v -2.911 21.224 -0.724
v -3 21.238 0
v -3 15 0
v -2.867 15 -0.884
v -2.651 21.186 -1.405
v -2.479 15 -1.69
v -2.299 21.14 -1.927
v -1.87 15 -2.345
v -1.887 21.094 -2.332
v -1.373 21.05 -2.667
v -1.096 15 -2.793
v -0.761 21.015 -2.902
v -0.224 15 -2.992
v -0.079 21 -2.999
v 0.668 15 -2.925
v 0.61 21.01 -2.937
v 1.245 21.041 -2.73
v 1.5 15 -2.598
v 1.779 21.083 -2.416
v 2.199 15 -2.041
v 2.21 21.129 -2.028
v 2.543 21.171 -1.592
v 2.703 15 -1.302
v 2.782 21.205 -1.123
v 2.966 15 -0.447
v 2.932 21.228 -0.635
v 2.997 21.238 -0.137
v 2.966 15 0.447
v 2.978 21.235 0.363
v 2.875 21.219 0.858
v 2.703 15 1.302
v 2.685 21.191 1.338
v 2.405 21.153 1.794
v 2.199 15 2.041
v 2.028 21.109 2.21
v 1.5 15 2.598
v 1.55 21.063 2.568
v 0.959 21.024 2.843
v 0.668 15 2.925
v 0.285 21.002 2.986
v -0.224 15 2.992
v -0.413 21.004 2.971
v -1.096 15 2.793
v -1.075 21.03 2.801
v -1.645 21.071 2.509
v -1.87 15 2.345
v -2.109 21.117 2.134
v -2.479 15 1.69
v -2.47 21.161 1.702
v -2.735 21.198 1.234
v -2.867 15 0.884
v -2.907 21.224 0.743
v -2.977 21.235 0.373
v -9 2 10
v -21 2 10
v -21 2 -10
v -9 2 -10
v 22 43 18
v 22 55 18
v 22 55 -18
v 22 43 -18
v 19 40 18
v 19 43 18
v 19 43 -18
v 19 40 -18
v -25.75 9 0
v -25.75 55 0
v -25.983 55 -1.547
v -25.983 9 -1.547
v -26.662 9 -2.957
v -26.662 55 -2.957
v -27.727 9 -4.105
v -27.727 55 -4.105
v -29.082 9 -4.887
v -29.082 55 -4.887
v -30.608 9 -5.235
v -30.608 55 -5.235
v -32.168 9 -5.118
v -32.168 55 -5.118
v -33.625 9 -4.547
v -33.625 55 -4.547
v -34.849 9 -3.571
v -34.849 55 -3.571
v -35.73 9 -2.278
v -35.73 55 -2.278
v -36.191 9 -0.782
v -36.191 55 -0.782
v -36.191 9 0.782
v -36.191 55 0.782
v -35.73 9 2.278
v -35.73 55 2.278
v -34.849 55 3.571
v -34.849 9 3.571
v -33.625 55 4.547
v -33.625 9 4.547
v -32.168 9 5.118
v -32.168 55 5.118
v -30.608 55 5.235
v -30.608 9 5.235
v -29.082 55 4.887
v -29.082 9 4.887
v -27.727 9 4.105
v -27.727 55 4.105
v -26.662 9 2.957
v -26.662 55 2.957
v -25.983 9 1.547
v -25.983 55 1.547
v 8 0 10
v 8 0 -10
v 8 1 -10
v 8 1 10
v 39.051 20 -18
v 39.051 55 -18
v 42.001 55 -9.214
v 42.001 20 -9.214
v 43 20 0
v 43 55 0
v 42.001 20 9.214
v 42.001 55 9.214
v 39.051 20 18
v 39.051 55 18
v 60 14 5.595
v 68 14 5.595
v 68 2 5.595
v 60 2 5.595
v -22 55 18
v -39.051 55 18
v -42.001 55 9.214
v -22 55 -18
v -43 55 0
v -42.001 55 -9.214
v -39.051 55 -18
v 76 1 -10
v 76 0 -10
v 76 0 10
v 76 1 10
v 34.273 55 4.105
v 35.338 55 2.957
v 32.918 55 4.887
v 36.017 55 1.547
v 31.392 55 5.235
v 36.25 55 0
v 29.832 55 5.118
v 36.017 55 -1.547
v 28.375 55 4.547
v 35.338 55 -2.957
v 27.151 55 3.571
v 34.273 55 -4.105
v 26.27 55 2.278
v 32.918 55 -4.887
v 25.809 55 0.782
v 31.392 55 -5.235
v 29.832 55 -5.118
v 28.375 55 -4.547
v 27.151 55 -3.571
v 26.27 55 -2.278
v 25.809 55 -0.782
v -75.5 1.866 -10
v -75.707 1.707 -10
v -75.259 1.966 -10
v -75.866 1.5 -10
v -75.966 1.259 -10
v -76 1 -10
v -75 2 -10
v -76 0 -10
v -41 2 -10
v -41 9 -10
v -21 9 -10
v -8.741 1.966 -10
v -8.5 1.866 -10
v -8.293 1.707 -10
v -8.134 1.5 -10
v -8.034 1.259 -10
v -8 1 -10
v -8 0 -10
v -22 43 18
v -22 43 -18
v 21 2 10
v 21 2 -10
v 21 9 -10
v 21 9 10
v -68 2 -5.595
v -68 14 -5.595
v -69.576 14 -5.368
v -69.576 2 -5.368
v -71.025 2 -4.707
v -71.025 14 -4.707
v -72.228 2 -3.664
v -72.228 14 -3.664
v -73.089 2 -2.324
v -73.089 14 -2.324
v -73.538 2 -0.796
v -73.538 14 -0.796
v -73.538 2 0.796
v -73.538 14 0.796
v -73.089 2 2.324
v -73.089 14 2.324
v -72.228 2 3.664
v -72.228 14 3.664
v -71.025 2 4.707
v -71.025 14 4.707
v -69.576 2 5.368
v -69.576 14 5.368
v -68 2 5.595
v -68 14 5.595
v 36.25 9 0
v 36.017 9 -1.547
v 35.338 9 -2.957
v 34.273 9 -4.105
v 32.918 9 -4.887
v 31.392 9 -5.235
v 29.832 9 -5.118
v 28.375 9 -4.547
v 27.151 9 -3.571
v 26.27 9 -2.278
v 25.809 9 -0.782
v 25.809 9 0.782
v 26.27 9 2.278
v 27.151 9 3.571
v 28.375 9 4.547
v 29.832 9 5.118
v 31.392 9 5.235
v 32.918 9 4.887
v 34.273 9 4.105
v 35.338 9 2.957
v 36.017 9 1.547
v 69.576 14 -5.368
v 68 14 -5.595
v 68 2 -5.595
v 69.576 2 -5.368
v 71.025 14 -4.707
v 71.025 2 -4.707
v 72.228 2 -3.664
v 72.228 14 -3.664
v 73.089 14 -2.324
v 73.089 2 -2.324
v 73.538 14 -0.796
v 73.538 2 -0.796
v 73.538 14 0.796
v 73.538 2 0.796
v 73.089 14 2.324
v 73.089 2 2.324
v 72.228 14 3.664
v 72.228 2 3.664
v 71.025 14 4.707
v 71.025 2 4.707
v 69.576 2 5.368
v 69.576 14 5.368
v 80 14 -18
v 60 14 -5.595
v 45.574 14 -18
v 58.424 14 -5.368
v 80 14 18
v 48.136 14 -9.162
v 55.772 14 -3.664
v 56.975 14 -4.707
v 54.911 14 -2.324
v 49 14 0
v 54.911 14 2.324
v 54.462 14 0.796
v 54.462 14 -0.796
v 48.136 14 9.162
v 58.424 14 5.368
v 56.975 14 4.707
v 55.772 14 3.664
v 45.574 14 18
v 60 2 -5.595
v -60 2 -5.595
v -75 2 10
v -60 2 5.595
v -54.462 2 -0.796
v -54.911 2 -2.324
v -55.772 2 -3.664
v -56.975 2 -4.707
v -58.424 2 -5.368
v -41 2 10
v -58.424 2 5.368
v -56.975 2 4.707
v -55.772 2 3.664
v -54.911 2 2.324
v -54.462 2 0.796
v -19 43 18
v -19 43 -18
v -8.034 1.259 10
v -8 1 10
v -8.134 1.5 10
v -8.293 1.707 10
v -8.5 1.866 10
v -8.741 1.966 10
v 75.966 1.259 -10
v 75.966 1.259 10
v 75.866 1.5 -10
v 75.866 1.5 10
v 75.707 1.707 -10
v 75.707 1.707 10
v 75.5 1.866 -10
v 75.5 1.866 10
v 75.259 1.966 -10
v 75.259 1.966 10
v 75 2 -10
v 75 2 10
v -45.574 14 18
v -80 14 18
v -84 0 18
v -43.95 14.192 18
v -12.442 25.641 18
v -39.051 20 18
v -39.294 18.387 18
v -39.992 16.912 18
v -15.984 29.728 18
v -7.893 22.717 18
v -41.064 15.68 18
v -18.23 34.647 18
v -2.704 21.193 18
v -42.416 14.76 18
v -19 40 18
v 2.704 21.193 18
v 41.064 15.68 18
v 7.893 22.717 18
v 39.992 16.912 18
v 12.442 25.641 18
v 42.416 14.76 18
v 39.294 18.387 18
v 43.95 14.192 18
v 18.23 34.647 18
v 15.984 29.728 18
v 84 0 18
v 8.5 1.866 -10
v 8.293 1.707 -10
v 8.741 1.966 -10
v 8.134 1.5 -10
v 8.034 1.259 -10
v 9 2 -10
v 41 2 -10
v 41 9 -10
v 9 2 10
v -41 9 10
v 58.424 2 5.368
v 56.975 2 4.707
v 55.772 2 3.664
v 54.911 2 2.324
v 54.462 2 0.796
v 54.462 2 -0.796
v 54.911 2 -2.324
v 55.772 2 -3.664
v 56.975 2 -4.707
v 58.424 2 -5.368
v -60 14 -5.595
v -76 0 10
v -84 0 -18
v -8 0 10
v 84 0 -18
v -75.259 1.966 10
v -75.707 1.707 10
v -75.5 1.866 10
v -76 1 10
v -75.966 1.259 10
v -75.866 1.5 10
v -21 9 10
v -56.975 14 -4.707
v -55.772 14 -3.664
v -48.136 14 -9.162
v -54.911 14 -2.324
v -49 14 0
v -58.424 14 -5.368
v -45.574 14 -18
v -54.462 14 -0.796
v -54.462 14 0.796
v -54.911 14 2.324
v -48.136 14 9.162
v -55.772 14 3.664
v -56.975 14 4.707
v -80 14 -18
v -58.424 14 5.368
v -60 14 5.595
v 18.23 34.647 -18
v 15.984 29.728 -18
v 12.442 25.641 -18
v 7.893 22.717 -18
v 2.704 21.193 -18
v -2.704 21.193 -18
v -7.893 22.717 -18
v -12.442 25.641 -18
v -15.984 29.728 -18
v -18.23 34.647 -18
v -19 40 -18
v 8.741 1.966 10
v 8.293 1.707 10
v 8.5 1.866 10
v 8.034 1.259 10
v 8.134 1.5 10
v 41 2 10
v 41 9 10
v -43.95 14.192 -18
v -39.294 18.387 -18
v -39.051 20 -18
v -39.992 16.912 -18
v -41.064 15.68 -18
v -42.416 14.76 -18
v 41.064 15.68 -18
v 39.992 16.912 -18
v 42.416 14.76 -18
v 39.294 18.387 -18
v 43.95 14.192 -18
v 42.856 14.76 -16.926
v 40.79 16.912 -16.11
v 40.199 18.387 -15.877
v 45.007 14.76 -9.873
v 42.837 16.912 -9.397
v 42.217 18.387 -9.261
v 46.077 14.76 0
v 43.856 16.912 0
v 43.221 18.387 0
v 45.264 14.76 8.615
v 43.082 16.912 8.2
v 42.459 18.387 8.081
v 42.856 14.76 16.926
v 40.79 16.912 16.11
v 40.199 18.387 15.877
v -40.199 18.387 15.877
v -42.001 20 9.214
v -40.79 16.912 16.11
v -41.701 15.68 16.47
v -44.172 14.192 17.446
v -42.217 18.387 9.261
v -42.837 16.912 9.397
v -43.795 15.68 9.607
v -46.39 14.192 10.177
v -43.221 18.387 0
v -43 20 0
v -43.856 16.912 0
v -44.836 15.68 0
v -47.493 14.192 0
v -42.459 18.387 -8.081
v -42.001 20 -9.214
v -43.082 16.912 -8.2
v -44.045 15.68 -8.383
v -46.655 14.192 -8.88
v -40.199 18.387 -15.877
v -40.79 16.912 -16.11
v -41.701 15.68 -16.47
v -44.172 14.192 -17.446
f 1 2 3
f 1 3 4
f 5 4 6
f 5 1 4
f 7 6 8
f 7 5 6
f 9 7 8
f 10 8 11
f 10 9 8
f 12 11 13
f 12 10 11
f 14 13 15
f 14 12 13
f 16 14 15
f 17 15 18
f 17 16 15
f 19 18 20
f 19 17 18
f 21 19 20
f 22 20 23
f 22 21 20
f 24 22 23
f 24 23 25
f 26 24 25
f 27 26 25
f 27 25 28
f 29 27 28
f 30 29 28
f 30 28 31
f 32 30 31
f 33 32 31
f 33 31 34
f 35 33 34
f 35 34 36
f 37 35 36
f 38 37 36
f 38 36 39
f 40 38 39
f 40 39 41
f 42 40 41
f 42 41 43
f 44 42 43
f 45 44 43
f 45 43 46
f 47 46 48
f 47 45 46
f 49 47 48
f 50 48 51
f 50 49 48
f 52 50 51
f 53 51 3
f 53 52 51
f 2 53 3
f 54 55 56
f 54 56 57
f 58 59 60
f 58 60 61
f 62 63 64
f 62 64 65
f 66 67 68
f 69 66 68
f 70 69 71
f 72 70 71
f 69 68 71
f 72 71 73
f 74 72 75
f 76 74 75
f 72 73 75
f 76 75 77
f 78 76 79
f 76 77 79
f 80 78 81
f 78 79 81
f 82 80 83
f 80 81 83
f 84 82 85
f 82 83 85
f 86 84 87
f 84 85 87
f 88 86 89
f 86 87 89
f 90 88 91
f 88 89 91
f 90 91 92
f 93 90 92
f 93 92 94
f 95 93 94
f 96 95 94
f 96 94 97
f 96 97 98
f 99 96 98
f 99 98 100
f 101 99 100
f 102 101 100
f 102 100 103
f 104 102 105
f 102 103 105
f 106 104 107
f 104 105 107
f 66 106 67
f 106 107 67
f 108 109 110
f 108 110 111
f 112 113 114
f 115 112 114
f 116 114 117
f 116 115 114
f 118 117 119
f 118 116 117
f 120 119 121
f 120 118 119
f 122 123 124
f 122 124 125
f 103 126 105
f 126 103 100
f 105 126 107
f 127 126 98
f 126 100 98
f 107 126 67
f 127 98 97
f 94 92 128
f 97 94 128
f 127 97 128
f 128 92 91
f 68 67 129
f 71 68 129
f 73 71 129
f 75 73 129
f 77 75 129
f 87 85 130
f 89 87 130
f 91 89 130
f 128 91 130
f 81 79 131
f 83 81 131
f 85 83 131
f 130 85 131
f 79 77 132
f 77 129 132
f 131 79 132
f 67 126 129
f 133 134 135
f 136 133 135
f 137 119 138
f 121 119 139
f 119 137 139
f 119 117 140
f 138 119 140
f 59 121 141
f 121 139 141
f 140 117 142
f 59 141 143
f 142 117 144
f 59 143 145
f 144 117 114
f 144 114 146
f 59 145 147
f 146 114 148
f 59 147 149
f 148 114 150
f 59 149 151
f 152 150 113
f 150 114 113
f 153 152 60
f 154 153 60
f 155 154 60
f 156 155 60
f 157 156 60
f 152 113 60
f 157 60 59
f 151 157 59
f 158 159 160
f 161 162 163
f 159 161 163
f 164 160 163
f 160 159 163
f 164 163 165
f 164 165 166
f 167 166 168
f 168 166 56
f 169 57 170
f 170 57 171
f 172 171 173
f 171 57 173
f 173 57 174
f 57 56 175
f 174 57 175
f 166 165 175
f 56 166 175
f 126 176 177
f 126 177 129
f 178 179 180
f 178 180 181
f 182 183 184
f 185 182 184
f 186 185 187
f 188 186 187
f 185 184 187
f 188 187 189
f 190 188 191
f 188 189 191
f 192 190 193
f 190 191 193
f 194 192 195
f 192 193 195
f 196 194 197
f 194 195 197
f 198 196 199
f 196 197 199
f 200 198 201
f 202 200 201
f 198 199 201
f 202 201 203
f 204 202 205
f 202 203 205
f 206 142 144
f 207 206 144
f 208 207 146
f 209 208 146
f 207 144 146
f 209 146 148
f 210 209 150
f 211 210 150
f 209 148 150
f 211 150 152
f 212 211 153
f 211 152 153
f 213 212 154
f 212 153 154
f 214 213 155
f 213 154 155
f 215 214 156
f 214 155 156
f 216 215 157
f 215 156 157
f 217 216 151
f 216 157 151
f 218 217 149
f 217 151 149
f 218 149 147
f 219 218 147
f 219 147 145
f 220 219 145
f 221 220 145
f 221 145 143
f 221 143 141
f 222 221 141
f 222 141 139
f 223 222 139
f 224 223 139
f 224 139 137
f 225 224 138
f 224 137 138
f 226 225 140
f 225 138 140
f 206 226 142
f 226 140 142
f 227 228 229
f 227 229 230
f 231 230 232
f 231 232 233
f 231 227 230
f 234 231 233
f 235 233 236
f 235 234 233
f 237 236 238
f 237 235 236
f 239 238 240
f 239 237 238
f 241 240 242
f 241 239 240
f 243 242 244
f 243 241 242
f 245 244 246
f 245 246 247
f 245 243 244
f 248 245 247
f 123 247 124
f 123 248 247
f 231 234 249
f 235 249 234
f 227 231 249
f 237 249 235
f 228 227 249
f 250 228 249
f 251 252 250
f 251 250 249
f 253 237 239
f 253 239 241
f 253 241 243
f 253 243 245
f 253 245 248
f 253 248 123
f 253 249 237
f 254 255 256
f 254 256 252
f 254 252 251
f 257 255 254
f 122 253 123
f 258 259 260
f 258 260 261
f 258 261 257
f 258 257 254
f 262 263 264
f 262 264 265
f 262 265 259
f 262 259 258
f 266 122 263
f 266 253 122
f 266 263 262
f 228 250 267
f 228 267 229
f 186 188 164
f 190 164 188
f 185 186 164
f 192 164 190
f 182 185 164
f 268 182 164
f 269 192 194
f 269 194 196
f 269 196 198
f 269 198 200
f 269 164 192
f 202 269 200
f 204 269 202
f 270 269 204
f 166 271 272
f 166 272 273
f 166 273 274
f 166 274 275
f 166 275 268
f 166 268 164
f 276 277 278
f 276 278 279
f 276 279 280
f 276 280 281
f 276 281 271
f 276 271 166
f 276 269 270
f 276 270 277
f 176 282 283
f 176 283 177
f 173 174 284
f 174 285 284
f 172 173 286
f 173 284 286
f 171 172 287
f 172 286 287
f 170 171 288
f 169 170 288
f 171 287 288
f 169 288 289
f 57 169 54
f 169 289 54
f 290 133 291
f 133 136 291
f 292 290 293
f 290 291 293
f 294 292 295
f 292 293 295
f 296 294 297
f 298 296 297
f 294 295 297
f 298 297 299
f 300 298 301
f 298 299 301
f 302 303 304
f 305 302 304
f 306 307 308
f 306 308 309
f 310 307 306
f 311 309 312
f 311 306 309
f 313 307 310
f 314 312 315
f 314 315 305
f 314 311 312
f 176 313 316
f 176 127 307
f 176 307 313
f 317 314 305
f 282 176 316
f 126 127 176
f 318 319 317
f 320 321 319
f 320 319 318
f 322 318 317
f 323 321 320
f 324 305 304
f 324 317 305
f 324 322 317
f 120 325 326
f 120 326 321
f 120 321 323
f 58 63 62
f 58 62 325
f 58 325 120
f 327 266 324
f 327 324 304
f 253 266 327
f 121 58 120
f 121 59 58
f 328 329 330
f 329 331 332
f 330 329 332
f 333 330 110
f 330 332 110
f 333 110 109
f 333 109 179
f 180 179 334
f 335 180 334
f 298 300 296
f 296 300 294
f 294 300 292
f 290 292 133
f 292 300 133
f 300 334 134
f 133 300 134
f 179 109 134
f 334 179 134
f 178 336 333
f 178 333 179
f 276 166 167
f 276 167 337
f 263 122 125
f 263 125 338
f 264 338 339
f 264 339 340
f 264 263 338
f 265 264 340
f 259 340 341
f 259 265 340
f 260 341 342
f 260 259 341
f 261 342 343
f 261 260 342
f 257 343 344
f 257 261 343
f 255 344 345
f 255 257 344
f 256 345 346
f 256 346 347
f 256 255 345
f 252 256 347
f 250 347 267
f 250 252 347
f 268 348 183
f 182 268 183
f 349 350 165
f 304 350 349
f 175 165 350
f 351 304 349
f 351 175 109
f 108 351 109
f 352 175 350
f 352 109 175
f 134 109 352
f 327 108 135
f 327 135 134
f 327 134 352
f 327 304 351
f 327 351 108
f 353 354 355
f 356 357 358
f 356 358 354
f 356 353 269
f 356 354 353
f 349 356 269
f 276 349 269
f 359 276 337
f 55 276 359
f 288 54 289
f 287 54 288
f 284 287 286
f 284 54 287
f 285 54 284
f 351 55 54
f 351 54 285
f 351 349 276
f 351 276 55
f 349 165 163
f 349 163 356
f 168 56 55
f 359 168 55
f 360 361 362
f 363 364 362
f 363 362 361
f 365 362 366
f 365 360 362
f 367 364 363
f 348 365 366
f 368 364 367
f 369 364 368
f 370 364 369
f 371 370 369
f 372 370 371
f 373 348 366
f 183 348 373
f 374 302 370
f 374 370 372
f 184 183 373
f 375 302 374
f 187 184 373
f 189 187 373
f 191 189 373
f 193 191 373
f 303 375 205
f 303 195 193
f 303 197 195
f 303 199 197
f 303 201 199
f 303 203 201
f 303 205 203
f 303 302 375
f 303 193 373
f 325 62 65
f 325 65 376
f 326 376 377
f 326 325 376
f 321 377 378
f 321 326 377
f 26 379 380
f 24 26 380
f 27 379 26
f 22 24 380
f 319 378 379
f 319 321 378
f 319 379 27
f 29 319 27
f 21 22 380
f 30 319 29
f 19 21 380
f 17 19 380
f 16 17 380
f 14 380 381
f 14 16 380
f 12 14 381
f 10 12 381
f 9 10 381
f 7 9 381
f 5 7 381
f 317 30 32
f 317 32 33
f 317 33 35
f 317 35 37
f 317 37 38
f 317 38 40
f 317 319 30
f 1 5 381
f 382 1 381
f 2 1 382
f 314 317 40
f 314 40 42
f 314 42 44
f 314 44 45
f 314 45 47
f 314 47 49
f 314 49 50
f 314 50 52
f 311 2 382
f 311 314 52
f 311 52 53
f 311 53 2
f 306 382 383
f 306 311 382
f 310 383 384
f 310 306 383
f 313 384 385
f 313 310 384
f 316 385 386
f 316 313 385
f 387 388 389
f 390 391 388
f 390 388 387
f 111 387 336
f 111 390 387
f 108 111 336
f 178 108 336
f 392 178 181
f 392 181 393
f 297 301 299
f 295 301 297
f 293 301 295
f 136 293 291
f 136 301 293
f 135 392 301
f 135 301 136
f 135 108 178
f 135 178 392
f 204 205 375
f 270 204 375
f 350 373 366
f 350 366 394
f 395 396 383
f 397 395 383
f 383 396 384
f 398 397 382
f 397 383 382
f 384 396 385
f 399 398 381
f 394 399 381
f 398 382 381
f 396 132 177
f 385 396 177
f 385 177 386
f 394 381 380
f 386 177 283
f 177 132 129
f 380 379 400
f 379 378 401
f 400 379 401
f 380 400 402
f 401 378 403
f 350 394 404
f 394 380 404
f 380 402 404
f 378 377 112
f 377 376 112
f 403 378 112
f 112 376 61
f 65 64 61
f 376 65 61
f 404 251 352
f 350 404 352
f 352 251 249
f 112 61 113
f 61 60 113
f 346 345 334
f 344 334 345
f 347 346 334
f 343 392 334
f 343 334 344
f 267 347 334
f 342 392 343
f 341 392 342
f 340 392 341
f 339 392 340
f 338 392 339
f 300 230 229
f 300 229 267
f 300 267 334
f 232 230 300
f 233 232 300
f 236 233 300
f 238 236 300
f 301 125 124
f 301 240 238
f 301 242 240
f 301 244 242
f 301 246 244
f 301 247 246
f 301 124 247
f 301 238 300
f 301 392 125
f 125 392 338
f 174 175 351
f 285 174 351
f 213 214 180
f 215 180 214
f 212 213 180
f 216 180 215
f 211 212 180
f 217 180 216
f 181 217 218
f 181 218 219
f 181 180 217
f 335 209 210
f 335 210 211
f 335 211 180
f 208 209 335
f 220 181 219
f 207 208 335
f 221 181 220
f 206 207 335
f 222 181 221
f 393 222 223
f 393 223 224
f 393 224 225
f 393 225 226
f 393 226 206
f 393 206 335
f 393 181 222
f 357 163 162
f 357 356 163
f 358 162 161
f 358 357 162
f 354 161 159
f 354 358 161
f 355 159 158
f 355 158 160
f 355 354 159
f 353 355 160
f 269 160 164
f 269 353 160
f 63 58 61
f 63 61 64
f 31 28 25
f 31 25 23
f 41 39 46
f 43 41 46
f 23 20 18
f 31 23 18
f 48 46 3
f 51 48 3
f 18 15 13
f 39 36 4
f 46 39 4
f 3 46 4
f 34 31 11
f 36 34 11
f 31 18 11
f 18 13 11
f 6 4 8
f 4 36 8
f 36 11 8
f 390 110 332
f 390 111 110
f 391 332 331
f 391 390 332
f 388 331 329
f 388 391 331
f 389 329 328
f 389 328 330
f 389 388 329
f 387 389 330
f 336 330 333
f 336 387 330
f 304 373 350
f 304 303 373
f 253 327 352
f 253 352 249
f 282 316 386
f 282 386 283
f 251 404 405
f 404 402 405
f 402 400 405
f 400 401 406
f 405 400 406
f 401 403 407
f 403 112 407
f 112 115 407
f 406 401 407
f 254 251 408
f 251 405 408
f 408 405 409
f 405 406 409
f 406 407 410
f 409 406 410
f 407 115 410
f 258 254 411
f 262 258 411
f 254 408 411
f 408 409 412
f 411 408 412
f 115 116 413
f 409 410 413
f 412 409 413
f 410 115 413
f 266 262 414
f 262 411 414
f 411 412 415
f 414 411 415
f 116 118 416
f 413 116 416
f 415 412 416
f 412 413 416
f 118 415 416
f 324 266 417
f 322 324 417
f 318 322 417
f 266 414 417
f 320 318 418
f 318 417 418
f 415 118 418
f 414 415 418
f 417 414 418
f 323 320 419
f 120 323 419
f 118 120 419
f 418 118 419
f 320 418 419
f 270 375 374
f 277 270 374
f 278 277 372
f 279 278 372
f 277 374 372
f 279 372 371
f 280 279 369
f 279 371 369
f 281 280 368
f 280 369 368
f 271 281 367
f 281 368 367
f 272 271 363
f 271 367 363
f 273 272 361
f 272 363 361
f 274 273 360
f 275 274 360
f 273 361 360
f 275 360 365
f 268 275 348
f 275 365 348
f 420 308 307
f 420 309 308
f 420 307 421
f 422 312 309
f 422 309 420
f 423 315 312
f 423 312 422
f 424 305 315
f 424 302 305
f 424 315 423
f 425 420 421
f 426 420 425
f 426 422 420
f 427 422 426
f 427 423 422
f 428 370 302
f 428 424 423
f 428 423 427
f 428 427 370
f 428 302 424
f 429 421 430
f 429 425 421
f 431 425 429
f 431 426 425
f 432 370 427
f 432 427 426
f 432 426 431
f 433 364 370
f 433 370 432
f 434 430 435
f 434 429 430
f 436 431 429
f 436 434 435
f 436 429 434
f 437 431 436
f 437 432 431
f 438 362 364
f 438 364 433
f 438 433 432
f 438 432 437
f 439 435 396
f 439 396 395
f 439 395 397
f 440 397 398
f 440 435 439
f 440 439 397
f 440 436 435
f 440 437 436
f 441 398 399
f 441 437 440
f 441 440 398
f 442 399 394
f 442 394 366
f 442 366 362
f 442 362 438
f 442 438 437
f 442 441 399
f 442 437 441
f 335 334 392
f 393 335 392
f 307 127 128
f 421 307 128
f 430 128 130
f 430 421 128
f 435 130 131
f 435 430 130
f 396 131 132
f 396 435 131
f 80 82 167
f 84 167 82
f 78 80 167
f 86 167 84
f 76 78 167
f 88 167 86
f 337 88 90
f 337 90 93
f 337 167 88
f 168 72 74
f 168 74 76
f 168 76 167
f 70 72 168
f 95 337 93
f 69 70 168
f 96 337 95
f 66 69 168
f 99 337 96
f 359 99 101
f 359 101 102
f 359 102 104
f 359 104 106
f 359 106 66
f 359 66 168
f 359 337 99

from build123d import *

# Parameters (mm, degrees)
BOSS_EXTRUDE1_DEPTH = 18
BOSS_EXTRUDE2_DEPTH = 41
CUT_EXTRUDE1_DEPTH  = 12
FILLET1_R           = 6
CUT_EXTRUDE2_DEPTH  = 37.0000001
SKETCH7_R           = 5.25
CUT_EXTRUDE3_DEPTH  = 46
SKETCH10_W          = 68
SKETCH10_H          = 20
CUT_EXTRUDE4_DEPTH  = 2
FILLET2_R           = 1
SKETCH11_W          = 20
SKETCH11_H          = 20
CUT_EXTRUDE5_DEPTH  = 9
SKETCH15_R          = 3
CUT_EXTRUDE6_DEPTH  = 10


with BuildPart() as part:
    # Sketch2 → Boss-Extrude1 (new body, symmetric)
    with BuildSketch(Plane.XY):
        Polygon((-84, 0), (84, 0), (80, 14), (-80, 14), align=None)
    extrude(amount=BOSS_EXTRUDE1_DEPTH, both=True)

    # Sketch3 → Boss-Extrude2 (add)
    with BuildSketch(Plane(origin=(0, 14, 0), x_dir=(1, 0, 0), z_dir=(0, 1, 0))):
        with BuildLine():
            Line((-39.05124838, 18), (39.05124838, 18))
            ThreePointArc((39.05124838, 18), (43, 0), (39.05124838, -18))
            Line((39.05124838, -18), (-39.05124838, -18))
            ThreePointArc((-39.05124838, -18), (-43, 0), (-39.05124838, 18))
        make_face()
    extrude(amount=BOSS_EXTRUDE2_DEPTH)

    # Sketch4 → Cut-Extrude1 (cut)
    with BuildSketch(Plane(origin=(0, 14, 0), x_dir=(1, 0, 0), z_dir=(0, 1, 0))):
        with BuildLine():
            Line((60, 5.595094271), (68, 5.595094271))
            ThreePointArc((68, 5.595094271), (73.595094271, 0), (68, -5.595094271))
            Line((68, -5.595094271), (60, -5.595094271))
            ThreePointArc((60, -5.595094271), (54.404905729, 0), (60, 5.595094271))
        make_face()
        with BuildLine():
            Line((-60, 5.595094271), (-68, 5.595094271))
            ThreePointArc((-68, 5.595094271), (-73.595094271, 0), (-68, -5.595094271))
            Line((-68, -5.595094271), (-60, -5.595094271))
            ThreePointArc((-60, -5.595094271), (-54.404905729, 0), (-60, 5.595094271))
        make_face()
    extrude(amount=-CUT_EXTRUDE1_DEPTH, mode=Mode.SUBTRACT)

    # Fillet1
    fillet1_edges = [part.edges().sort_by_distance(p)[0] for p in [
        (43, 14, 0),
        (-43, 14, 0),
    ]]
    fillet(fillet1_edges, radius=FILLET1_R)

    # Sketch5 → Cut-Extrude2 (cut, through all)
    with BuildSketch(Plane.XY.offset(18)):
        with BuildLine():
            Line((22, 55), (22, 43))
            Line((22, 43), (19, 43))
            Line((19, 43), (19, 40))
            ThreePointArc((19, 40), (0, 21), (-19, 40))
            Line((-19, 40), (-19, 43))
            Line((-19, 43), (-22, 43))
            Line((-22, 43), (-22, 55))
            Line((-22, 55), (22, 55))
        make_face()
    extrude(amount=-CUT_EXTRUDE2_DEPTH, mode=Mode.SUBTRACT)

    # Sketch7 → Cut-Extrude3 (cut)
    with BuildSketch(Plane(origin=(0, 55, 0), x_dir=(1, 0, 0), z_dir=(0, 1, 0))):
        with Locations((31, 0)):
            Circle(SKETCH7_R)
        with Locations((-31, 0)):
            Circle(SKETCH7_R)
    extrude(amount=-CUT_EXTRUDE3_DEPTH, mode=Mode.SUBTRACT)

    # Sketch10 → Cut-Extrude4 (cut)
    with BuildSketch(Plane.XZ):
        with Locations((42, 0)):
            Rectangle(SKETCH10_W, SKETCH10_H)
        with Locations((-42, 0)):
            Rectangle(SKETCH10_W, SKETCH10_H)
    extrude(amount=-CUT_EXTRUDE4_DEPTH, mode=Mode.SUBTRACT)

    # Fillet2
    fillet2_edges = [part.edges().sort_by_distance(p)[0] for p in [
        (76, 2, 0),
        (8, 2, 0),
        (-8, 2, 0),
        (-76, 2, 0),
    ]]
    fillet(fillet2_edges, radius=FILLET2_R)

    # Sketch11 → Cut-Extrude5 (cut)
    with BuildSketch(Plane.XZ):
        with Locations((31, 0)):
            Rectangle(SKETCH11_W, SKETCH11_H)
        with Locations((-31, 0)):
            Rectangle(SKETCH11_W, SKETCH11_H)
    extrude(amount=-CUT_EXTRUDE5_DEPTH, mode=Mode.SUBTRACT)

    # Sketch15 → Cut-Extrude6 (cut)
    with BuildSketch(Plane(origin=(0, 25, 0), x_dir=(-1, 0, 0), z_dir=(0, -1, 0))):
        Circle(SKETCH15_R)
    extrude(amount=CUT_EXTRUDE6_DEPTH, mode=Mode.SUBTRACT)


solid = part.part
